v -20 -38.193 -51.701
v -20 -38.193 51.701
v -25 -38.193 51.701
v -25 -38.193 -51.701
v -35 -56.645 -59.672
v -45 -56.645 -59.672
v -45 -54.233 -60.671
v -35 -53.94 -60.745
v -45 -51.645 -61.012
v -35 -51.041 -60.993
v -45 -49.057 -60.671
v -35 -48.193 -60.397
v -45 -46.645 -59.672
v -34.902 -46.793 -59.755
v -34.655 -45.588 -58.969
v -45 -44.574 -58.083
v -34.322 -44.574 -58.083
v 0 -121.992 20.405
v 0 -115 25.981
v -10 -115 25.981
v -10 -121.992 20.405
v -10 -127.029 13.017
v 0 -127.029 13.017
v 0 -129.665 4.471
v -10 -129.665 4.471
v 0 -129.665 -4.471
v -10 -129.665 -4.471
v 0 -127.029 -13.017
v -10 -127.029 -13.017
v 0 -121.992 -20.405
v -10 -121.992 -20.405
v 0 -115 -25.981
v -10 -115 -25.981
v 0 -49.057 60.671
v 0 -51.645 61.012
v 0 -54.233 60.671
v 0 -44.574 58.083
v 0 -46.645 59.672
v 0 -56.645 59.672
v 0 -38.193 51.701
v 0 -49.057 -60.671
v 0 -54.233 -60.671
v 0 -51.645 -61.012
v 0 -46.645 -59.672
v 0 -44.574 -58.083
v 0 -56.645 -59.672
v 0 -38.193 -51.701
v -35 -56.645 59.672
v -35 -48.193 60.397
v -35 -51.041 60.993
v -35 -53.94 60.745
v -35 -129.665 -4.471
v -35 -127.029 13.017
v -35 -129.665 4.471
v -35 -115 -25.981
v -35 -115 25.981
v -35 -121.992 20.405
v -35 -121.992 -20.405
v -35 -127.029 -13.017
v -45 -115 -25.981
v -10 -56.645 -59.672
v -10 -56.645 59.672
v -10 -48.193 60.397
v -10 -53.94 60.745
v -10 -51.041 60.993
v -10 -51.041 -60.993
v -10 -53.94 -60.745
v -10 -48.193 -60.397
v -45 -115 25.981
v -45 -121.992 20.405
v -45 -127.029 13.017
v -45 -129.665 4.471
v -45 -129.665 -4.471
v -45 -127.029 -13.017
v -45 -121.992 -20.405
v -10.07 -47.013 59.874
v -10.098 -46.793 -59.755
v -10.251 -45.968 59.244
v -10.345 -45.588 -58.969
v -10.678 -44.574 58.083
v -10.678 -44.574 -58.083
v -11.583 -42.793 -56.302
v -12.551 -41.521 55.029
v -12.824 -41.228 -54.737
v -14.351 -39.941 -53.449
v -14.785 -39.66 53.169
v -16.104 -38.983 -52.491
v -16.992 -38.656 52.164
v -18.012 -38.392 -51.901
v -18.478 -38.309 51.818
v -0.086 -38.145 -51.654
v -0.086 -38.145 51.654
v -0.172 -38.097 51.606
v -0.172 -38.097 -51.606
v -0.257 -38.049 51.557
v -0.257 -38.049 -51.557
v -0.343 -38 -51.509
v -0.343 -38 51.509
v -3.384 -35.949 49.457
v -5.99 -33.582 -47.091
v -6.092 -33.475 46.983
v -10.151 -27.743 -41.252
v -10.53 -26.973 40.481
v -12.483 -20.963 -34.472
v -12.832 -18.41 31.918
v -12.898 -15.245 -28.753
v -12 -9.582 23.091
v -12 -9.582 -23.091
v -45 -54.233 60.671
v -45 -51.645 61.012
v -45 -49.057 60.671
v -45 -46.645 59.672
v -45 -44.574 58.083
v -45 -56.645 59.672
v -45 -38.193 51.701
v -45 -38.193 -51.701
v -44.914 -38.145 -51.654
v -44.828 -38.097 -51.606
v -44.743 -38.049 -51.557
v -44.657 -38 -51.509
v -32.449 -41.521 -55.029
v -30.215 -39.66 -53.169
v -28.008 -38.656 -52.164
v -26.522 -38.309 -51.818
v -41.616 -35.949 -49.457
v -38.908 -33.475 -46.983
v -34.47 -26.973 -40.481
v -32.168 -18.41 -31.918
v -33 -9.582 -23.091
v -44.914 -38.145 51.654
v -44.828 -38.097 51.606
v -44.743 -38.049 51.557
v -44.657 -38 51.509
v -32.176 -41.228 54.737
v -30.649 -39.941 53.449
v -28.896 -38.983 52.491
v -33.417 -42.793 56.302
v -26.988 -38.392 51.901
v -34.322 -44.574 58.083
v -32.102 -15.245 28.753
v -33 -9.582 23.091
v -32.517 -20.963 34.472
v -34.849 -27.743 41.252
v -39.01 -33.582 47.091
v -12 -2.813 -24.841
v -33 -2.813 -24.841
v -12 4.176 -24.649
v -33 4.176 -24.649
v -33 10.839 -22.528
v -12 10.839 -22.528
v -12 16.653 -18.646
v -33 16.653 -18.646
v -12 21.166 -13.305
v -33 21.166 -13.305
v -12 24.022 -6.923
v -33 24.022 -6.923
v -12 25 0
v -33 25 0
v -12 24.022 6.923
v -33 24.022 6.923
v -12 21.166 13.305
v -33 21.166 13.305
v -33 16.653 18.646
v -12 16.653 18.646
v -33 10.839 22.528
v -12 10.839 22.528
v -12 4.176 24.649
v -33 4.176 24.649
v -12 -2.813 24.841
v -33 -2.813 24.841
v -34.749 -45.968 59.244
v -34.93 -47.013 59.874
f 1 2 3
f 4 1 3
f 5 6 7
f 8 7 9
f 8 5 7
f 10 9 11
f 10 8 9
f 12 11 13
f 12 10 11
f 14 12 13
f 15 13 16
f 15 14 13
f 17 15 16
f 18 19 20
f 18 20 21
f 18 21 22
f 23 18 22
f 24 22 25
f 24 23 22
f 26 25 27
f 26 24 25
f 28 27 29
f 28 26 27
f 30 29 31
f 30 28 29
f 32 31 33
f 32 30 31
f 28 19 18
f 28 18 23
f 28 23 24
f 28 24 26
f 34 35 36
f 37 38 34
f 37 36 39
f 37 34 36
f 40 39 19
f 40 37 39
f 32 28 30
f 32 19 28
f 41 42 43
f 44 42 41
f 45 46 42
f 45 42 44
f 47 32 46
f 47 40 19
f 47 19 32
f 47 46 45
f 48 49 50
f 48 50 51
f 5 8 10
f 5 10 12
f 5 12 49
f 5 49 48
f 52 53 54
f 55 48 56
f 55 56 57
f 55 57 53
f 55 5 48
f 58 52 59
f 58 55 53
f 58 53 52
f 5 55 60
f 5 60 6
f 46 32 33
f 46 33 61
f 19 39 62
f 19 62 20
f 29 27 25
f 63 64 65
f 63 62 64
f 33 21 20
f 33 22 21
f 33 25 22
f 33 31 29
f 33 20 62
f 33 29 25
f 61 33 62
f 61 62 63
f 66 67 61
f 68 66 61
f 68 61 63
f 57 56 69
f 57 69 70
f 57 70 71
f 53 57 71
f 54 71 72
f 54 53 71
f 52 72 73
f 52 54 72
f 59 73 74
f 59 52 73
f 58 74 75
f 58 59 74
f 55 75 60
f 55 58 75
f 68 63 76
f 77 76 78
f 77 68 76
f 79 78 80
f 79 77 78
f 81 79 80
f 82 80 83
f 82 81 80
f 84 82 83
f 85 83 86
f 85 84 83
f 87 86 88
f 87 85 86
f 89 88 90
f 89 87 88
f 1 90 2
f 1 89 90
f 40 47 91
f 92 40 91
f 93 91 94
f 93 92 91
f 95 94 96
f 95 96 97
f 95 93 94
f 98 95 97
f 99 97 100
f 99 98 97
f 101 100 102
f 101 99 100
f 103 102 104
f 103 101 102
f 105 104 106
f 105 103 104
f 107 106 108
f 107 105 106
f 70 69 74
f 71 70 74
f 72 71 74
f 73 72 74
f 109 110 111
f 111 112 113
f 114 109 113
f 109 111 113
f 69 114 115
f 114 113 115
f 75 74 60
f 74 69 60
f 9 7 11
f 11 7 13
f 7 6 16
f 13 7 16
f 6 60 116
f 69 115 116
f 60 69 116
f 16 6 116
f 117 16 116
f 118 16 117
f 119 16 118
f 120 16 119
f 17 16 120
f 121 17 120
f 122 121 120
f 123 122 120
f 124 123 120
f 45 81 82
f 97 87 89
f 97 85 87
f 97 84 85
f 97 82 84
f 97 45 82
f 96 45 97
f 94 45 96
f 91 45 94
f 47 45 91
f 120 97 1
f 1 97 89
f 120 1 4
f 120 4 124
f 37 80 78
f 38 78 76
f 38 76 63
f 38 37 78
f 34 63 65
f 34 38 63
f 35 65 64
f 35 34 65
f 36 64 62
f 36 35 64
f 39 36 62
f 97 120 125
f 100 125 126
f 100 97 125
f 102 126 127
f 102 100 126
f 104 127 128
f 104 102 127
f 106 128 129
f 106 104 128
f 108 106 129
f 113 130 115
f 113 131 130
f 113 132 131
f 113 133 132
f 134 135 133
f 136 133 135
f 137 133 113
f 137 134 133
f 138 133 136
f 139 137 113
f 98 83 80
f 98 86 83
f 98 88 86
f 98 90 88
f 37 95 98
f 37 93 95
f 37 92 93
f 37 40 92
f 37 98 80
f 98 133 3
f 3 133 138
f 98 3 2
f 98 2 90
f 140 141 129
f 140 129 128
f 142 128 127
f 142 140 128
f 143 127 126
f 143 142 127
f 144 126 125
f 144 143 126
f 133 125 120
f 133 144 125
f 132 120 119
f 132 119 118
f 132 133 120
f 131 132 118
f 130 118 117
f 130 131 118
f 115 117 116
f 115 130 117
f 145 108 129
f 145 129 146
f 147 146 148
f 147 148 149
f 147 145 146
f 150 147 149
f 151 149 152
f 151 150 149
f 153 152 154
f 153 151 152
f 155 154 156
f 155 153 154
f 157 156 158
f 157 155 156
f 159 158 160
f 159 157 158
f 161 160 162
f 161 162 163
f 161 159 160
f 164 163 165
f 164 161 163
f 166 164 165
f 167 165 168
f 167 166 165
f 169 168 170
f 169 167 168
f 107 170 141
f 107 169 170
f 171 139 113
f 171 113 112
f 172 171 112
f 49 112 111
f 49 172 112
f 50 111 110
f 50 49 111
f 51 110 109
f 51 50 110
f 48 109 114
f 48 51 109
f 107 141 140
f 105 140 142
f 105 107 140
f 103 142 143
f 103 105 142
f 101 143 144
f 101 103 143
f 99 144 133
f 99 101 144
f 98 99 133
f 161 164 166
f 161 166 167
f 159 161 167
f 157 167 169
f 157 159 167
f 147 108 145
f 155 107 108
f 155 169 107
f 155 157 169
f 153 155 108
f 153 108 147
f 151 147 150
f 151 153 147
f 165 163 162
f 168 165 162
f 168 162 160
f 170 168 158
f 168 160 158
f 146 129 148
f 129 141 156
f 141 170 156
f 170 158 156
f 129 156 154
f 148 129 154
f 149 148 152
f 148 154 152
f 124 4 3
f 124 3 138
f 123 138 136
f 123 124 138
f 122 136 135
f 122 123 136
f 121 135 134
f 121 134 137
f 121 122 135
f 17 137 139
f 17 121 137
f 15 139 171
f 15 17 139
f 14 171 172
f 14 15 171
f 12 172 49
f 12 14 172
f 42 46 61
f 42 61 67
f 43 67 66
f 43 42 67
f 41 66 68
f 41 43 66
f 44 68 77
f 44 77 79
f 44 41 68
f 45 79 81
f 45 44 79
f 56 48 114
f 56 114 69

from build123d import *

# Parameters (mm, degrees)
BOSS_EXTRUDE2_DEPTH     = 45
CUT_EXTRUDE2_DEPTH      = 12
CUT_EXTRUDE4_START      = -33
CUT_EXTRUDE4_DEPTH      = 12
CUT_EXTRUDE5_DEPTH      = 182.957313627
CUT_EXTRUDE7_DEPTH      = 182.957313627
CUT_EXTRUDE7_DEPTH_BACK = 182.957313627


with BuildPart() as part:
    # Sketch1 → Boss-Extrude2 (new body)
    with BuildSketch(Plane(origin=(0, 0, 0), x_dir=(0, 0, -1), z_dir=(1, 0, 0))):
        with BuildLine():
            Line((-59.671894671, -56.645246646), (-25.980762114, -115))
            ThreePointArc((-25.980762114, -115), (0, -130), (25.980762114, -115))
            Line((25.980762114, -115), (59.671894671, -56.645246646))
            ThreePointArc((59.671894671, -56.645246646), (60.926089247, -50.339984724), (58.082708445, -44.574178834))
            Line((58.082708445, -44.574178834), (51.508529611, -38))
            Line((51.508529611, -38), (-51.508529611, -38))
            Line((-51.508529611, -38), (-58.082708445, -44.574178834))
            ThreePointArc((-58.082708445, -44.574178834), (-60.926089247, -50.339984724), (-59.671894671, -56.645246646))
        make_face()
        with BuildLine():
            Line((-23.090724242, -9.582194632), (-51.508529611, -38))
            Line((-51.508529611, -38), (51.508529611, -38))
            Line((51.508529611, -38), (23.090724242, -9.582194632))
            ThreePointArc((23.090724242, -9.582194632), (0, 25), (-23.090724242, -9.582194632))
        make_face()
    extrude(amount=-BOSS_EXTRUDE2_DEPTH)

    # Sketch3 → Cut-Extrude2 (cut)
    with BuildSketch(Plane(origin=(0, 0, 0), x_dir=(0, 0, -1), z_dir=(1, 0, 0))):
        with BuildLine():
            Line((-23.090724242, -9.582194632), (23.090724242, -9.582194632))
            ThreePointArc((23.090724242, -9.582194632), (0, 25), (-23.090724242, -9.582194632))
        make_face()
    extrude(amount=-CUT_EXTRUDE2_DEPTH, mode=Mode.SUBTRACT)

    # Sketch4 → Cut-Extrude4 (cut)
    with BuildSketch(Plane(origin=(0, 0, 0), x_dir=(0, 0, -1), z_dir=(1, 0, 0)).offset(CUT_EXTRUDE4_START)):
        with BuildLine():
            Line((-23.090724242, -9.582194632), (23.090724242, -9.582194632))
            ThreePointArc((23.090724242, -9.582194632), (0, 25), (-23.090724242, -9.582194632))
        make_face()
    extrude(amount=-CUT_EXTRUDE4_DEPTH, mode=Mode.SUBTRACT)

    # Sketch11 → Cut-Extrude5 (cut, through all)
    with BuildSketch(Plane.XY.offset(58.082708445)):
        with BuildLine():
            Line((-12, -9.582194632), (0, -9.582194632))
            Line((0, -9.582194632), (0, -38.192729996))
            ThreePointArc((0, -38.192729996), (-10.975035155, -25.97412099), (-12, -9.582194632))
        make_face()
        with BuildLine():
            Line((-45, -9.582194632), (-33, -9.582194632))
            ThreePointArc((-33, -9.582194632), (-34.024964845, -25.97412099), (-45, -38.192729996))
            Line((-45, -38.192729996), (-45, -9.582194632))
        make_face()
    extrude(amount=-CUT_EXTRUDE5_DEPTH, mode=Mode.SUBTRACT)

    # Sketch12 → Cut-Extrude7 (cut, two sides: drawn at the far end of the back side and taken through both)
    with BuildSketch(Plane.XY.offset(58.082708445).offset(-CUT_EXTRUDE7_DEPTH_BACK)):
        with BuildLine():
            Line((-35, -130.192729996), (-10, -130.192729996))
            Line((-10, -130.192729996), (-10, -48.192729996))
            ThreePointArc((-10, -48.192729996), (-12.928932188, -41.121662184), (-20, -38.192729996))
            Line((-20, -38.192729996), (-25, -38.192729996))
            ThreePointArc((-25, -38.192729996), (-32.071067812, -41.121662184), (-35, -48.192729996))
            Line((-35, -48.192729996), (-35, -130.192729996))
        make_face()
    extrude(amount=CUT_EXTRUDE7_DEPTH + CUT_EXTRUDE7_DEPTH_BACK, mode=Mode.SUBTRACT)


solid = part.part
